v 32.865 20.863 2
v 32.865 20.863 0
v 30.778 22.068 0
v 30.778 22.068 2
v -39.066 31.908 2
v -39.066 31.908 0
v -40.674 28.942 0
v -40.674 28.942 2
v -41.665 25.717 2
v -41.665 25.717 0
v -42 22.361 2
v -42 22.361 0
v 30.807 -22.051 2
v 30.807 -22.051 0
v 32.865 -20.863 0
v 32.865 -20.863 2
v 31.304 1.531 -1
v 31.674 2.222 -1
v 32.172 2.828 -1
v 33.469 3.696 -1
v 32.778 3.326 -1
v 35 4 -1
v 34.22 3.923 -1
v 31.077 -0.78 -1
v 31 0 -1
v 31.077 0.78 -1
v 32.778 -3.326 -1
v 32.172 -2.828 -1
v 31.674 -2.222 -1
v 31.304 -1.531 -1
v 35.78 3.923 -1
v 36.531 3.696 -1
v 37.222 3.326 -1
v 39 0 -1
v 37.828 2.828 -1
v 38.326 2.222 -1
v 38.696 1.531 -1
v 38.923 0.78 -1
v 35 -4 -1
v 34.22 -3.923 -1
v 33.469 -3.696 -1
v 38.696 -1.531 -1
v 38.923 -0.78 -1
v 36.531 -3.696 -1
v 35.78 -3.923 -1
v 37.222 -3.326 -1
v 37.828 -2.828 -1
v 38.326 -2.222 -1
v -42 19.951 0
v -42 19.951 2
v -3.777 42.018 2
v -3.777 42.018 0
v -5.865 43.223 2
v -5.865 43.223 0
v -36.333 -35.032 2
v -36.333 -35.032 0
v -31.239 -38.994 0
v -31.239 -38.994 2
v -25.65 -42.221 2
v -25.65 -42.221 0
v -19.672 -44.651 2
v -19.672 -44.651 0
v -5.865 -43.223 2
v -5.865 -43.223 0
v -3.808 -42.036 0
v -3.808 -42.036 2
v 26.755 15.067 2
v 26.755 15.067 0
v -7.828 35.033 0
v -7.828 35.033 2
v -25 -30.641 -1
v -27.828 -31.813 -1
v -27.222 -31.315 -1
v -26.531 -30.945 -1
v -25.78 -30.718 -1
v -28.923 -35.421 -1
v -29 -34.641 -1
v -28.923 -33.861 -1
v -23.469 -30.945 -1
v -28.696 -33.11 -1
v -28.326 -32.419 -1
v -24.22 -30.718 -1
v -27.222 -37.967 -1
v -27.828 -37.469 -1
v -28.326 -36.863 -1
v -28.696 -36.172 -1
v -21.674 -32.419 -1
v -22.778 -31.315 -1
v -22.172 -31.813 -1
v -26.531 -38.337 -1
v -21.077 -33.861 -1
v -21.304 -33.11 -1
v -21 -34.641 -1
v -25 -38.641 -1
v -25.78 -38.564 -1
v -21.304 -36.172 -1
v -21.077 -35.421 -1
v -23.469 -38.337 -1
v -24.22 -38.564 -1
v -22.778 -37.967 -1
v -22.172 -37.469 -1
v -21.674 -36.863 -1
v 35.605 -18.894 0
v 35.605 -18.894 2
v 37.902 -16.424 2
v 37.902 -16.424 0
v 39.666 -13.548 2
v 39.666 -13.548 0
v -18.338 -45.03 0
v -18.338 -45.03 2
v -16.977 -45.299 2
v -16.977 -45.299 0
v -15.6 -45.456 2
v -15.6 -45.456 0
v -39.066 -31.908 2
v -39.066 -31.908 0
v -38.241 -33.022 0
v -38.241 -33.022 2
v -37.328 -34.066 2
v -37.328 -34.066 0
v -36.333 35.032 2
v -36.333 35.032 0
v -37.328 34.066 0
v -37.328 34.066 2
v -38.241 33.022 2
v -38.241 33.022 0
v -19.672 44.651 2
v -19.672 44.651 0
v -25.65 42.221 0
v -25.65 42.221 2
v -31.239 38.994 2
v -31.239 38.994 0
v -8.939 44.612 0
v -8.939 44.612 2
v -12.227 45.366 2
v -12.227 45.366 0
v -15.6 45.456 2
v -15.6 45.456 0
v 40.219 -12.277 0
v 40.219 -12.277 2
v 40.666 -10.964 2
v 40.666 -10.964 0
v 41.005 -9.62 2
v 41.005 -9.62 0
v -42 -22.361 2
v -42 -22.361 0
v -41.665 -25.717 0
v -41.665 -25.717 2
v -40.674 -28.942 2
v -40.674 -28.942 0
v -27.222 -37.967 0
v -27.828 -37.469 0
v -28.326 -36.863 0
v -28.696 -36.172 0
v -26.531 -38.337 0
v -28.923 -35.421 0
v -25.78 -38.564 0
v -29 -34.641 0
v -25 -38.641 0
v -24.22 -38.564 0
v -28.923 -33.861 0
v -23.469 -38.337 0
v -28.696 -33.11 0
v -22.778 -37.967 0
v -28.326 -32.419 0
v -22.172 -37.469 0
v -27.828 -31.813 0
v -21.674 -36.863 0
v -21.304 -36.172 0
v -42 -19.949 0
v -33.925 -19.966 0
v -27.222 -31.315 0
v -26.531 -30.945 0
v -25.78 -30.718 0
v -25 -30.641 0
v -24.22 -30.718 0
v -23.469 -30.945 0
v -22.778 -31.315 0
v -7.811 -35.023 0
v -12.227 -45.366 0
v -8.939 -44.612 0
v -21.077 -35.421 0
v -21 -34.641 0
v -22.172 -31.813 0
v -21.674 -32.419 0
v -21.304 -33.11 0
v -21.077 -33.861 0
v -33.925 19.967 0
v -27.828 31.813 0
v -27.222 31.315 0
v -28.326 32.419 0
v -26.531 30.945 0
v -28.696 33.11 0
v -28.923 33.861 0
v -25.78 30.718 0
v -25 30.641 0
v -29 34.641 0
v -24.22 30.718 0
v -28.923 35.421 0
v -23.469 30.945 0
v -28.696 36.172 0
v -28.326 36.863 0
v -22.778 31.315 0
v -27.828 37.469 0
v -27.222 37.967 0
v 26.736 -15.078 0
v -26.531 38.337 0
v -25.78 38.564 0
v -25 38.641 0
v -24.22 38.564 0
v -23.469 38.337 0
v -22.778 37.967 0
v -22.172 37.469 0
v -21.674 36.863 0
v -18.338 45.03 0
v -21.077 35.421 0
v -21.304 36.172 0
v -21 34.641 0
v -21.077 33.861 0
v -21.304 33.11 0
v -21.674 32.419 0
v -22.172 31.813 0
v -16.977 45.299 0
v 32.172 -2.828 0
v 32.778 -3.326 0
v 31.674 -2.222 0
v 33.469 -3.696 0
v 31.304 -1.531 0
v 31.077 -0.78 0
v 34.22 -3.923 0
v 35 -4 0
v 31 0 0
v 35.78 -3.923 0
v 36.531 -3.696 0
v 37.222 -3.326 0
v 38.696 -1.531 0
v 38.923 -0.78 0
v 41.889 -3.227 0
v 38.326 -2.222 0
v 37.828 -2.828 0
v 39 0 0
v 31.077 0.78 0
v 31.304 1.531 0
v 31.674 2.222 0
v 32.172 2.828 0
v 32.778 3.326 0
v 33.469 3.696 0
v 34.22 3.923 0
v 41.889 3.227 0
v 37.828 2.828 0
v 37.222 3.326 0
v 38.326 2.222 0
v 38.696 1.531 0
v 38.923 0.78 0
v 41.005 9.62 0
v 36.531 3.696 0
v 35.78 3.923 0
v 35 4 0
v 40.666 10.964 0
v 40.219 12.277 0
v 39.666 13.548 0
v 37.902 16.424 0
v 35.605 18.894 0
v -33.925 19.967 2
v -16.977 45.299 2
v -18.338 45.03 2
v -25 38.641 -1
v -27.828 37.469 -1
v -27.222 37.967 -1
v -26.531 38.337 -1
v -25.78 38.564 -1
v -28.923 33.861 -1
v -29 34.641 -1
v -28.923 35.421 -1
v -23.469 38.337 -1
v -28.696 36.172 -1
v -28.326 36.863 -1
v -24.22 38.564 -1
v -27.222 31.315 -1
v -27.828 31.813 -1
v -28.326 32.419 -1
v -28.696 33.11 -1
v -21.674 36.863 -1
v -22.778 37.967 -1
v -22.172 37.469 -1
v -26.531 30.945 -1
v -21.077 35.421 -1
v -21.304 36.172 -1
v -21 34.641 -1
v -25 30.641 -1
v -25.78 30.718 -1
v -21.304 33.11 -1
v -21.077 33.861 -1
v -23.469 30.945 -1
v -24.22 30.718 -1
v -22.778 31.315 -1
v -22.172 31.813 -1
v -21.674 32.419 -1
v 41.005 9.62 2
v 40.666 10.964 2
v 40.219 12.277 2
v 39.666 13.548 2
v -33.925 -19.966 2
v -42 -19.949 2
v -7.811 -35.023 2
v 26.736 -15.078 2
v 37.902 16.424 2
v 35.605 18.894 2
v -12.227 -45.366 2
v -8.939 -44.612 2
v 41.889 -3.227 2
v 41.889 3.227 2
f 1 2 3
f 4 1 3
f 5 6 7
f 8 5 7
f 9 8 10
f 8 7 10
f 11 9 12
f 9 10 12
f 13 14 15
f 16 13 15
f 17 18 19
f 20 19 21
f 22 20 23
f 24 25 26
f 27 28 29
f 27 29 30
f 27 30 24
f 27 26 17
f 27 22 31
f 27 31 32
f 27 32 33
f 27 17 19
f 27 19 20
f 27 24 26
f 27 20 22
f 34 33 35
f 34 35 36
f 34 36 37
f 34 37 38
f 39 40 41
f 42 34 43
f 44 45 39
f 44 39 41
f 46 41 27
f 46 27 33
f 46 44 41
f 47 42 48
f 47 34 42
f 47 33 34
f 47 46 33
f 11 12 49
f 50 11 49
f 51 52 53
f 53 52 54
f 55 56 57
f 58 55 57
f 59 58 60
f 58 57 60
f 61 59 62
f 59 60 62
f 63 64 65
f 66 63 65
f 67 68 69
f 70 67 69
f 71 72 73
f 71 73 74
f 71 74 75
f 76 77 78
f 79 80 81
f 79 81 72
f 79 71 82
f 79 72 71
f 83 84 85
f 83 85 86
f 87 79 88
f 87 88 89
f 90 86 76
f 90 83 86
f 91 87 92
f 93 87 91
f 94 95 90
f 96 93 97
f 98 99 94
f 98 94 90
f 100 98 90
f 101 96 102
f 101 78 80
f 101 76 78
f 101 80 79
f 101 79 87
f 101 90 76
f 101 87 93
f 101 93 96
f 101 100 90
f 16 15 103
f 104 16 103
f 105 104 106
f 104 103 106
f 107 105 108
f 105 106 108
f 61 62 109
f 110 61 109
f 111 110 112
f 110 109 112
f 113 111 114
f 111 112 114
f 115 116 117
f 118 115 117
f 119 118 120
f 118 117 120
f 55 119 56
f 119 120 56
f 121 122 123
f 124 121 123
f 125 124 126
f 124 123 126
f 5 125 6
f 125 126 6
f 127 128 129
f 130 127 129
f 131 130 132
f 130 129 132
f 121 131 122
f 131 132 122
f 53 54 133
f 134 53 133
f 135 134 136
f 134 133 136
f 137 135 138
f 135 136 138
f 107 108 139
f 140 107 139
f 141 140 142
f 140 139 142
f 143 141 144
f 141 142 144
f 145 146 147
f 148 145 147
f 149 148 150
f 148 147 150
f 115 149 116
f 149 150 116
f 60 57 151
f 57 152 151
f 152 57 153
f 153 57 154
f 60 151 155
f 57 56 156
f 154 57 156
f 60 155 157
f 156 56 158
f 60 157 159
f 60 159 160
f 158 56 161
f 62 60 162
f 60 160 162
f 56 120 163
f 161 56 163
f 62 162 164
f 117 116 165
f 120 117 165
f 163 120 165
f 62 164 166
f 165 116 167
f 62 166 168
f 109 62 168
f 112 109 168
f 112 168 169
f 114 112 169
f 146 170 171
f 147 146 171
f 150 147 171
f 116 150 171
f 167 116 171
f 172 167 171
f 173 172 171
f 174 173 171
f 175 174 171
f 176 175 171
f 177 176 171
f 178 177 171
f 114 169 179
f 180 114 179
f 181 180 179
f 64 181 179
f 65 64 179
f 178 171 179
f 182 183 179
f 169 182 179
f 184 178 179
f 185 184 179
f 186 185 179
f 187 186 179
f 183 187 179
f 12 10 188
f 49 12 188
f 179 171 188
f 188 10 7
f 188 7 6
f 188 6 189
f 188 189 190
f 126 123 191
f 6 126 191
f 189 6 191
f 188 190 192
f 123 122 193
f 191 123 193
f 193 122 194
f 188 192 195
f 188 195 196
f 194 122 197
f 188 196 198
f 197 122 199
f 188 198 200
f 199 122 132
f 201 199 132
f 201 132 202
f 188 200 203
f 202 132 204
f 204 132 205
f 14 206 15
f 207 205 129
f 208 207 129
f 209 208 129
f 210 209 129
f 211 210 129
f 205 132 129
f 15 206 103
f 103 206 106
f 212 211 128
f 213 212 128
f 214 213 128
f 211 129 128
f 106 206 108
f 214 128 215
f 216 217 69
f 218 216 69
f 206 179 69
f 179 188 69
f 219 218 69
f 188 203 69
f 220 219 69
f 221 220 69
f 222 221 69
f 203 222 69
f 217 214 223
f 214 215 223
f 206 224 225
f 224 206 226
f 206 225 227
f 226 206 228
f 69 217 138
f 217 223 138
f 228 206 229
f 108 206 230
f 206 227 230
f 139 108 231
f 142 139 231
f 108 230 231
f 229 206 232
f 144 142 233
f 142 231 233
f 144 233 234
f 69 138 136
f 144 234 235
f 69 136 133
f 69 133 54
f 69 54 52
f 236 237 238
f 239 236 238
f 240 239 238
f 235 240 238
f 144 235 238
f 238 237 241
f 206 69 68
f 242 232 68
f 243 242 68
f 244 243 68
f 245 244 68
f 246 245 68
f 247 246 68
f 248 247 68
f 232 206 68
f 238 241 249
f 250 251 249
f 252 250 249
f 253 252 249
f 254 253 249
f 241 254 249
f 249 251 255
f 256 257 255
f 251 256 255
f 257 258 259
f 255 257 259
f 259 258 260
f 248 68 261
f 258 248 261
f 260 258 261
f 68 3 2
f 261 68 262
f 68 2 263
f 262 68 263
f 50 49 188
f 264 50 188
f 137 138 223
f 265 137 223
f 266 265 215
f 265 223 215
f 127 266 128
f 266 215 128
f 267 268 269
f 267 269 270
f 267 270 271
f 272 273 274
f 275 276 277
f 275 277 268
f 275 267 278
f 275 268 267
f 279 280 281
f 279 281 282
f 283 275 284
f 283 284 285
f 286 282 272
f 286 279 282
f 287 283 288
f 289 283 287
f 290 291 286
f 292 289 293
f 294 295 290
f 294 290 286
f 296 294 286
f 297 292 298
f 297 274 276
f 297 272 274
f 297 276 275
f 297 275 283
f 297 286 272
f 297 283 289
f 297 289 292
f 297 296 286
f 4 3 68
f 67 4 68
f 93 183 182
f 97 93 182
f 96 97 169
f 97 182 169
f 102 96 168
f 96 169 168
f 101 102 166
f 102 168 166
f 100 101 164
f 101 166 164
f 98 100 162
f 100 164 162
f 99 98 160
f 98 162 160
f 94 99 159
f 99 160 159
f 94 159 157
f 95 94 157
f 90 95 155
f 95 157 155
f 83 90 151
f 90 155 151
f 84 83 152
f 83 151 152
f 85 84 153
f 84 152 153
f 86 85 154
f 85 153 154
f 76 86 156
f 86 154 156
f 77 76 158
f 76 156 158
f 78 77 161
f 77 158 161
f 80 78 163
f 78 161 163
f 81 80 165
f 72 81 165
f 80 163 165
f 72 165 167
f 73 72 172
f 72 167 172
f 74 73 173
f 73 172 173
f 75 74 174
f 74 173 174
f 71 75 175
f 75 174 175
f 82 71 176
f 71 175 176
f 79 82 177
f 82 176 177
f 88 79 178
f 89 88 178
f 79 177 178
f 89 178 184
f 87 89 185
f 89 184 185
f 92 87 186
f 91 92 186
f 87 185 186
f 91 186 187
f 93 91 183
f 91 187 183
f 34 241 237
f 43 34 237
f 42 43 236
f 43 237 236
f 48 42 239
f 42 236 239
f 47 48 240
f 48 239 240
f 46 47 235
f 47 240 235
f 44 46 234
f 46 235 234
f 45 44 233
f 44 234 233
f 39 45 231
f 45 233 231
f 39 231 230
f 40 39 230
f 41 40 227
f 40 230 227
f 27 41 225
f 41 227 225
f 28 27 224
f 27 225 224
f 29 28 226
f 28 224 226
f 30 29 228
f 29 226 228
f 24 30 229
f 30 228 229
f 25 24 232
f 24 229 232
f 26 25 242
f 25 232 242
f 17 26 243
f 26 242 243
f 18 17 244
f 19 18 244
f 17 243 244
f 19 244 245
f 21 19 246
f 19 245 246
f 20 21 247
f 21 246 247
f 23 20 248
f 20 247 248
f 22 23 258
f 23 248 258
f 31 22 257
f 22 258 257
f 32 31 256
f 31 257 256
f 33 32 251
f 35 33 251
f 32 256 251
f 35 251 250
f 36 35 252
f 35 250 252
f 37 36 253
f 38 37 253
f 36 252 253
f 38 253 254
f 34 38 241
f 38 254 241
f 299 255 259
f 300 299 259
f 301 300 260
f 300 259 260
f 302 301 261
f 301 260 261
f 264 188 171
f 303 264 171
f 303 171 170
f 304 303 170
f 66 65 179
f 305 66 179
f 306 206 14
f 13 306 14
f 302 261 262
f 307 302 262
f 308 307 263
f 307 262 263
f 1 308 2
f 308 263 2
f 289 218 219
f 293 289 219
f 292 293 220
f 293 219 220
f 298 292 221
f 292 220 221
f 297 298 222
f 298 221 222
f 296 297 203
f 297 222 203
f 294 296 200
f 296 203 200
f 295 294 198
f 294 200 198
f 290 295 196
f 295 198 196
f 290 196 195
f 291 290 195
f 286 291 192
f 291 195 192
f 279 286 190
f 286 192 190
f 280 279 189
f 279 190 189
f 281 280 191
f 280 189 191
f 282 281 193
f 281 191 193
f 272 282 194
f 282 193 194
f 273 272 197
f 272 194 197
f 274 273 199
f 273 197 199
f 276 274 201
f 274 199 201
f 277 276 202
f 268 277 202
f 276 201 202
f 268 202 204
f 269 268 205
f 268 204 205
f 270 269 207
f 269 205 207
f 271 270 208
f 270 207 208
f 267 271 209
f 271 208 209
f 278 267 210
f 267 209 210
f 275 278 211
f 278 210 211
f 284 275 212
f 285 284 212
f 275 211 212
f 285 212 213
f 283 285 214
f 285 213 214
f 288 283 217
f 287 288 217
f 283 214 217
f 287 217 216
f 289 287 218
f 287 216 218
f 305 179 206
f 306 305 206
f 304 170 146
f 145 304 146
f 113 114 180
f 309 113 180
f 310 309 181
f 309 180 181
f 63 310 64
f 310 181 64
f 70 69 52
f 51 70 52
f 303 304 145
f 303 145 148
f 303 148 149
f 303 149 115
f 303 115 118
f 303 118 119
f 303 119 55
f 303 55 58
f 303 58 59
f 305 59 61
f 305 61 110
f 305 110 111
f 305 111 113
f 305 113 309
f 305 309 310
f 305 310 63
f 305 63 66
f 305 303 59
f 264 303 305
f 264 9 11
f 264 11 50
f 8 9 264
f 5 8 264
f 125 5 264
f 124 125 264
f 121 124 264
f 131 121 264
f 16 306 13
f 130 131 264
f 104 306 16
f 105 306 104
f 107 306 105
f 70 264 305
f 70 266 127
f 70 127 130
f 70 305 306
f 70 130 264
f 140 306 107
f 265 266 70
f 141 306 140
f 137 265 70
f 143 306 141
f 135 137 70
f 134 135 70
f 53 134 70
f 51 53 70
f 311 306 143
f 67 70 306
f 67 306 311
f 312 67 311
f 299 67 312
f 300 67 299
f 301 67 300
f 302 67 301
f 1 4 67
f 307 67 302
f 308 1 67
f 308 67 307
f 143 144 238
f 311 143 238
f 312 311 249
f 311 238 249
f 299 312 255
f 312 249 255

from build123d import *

# Parameters (mm, degrees)
SKETCH1_R           = 5
BOSS_EXTRUDE1_DEPTH = 2
SKETCH2_R           = 6
BOSS_EXTRUDE2_DEPTH = 2
SKETCH4_R           = 4
BOSS_EXTRUDE3_DEPTH = 1


with BuildPart() as part:
    # Sketch1 → Boss-Extrude1 (new body)
    with BuildSketch(Plane.XY):
        with BuildLine():
            Line((26.754759572, 15.066584336), (-7.828159274, 35.03304384))
            Line((-7.828159274, 35.03304384), (-3.776725793, 42.017662227))
            Line((-3.776725793, 42.017662227), (-5.864916731, 43.223279828))
            ThreePointArc((-5.864916731, 43.223279828), (-10.564626295, 45.070633496), (-15.599655414, 45.455948092))
            ThreePointArc((-15.599655414, 45.455948092), (-17.660328687, 45.178385552), (-19.671702879, 44.651328476))
            ThreePointArc((-19.671702879, 44.651328476), (-28.5, 40.703193978), (-36.333333333, 35.031731647))
            ThreePointArc((-36.333333333, 35.031731647), (-37.795465247, 33.553359039), (-39.066178094, 31.907544906))
            ThreePointArc((-39.066178094, 31.907544906), (-41.250000425, 27.354424482), (-42, 22.360679775))
            Line((-42, 22.360679775), (-42, 19.950798463))
            Line((-42, 19.950798463), (-33.9254247, 19.967136312))
            Line((-33.9254247, 19.967136312), (-33.9254247, -19.965779701))
            Line((-33.9254247, -19.965779701), (-42, -19.949444575))
            Line((-42, -19.949444575), (-42, -22.360679775))
            ThreePointArc((-42, -22.360679775), (-41.250000425, -27.354424482), (-39.066178094, -31.907544906))
            ThreePointArc((-39.066178094, -31.907544906), (-37.795465247, -33.553359039), (-36.333333333, -35.031731647))
            ThreePointArc((-36.333333333, -35.031731647), (-28.5, -40.703193978), (-19.671702879, -44.651328476))
            ThreePointArc((-19.671702879, -44.651328476), (-17.660328687, -45.178385552), (-15.599655414, -45.455948092))
            ThreePointArc((-15.599655414, -45.455948092), (-10.564626295, -45.070633496), (-5.864916731, -43.223279828))
            Line((-5.864916731, -43.223279828), (-3.808380011, -42.035937798))
            Line((-3.808380011, -42.035937798), (-7.811356047, -35.023340495))
            Line((-7.811356047, -35.023340495), (26.735608761, -15.07764306))
            Line((26.735608761, -15.07764306), (30.807203868, -22.050621128))
            Line((30.807203868, -22.050621128), (32.864916731, -20.862600053))
            ThreePointArc((32.864916731, -20.862600053), (36.81462672, -17.716209014), (39.665833508, -13.548403186))
            ThreePointArc((39.665833508, -13.548403186), (40.455793934, -11.625026513), (41.005036212, -9.619596828))
            ThreePointArc((41.005036212, -9.619596828), (42, 0), (41.005036212, 9.619596828))
            ThreePointArc((41.005036212, 9.619596828), (40.455793934, 11.625026513), (39.665833508, 13.548403186))
            ThreePointArc((39.665833508, 13.548403186), (36.81462672, 17.716209014), (32.864916731, 20.862600053))
            Line((32.864916731, 20.862600053), (30.777898295, 22.067540709))
            Line((30.777898295, 22.067540709), (26.754759572, 15.066584336))
        make_face()
        with Locations((-25, 34.641016151)):
            Circle(SKETCH1_R, mode=Mode.SUBTRACT)
        with Locations((35, 0)):
            Circle(SKETCH1_R, mode=Mode.SUBTRACT)
        with Locations((-25, -34.641016151)):
            Circle(SKETCH1_R, mode=Mode.SUBTRACT)
    extrude(amount=BOSS_EXTRUDE1_DEPTH)

    # Sketch2 → Boss-Extrude2 (add)
    with BuildSketch(Plane.XY.offset(2)):
        with Locations((-25, 34.641016151)):
            Circle(SKETCH2_R)
        with Locations((-25, -34.641016151)):
            Circle(SKETCH2_R)
        with Locations((35, 0)):
            Circle(SKETCH2_R)
    extrude(amount=-BOSS_EXTRUDE2_DEPTH)

    # Sketch4 → Boss-Extrude3 (add)
    with BuildSketch(Plane(origin=(0, 0, 0), x_dir=(-1, 0, 0), z_dir=(0, 0, -1))):
        with Locations(Location((25, 34.641016151, 0), (0, 0, 180))):
            Circle(SKETCH4_R)
        with Locations(Location((-35, 0, 0), (0, 0, 180))):
            Circle(SKETCH4_R)
        with Locations(Location((25, -34.641016151, 0), (0, 0, 180))):
            Circle(SKETCH4_R)
    extrude(amount=BOSS_EXTRUDE3_DEPTH)


solid = part.part
